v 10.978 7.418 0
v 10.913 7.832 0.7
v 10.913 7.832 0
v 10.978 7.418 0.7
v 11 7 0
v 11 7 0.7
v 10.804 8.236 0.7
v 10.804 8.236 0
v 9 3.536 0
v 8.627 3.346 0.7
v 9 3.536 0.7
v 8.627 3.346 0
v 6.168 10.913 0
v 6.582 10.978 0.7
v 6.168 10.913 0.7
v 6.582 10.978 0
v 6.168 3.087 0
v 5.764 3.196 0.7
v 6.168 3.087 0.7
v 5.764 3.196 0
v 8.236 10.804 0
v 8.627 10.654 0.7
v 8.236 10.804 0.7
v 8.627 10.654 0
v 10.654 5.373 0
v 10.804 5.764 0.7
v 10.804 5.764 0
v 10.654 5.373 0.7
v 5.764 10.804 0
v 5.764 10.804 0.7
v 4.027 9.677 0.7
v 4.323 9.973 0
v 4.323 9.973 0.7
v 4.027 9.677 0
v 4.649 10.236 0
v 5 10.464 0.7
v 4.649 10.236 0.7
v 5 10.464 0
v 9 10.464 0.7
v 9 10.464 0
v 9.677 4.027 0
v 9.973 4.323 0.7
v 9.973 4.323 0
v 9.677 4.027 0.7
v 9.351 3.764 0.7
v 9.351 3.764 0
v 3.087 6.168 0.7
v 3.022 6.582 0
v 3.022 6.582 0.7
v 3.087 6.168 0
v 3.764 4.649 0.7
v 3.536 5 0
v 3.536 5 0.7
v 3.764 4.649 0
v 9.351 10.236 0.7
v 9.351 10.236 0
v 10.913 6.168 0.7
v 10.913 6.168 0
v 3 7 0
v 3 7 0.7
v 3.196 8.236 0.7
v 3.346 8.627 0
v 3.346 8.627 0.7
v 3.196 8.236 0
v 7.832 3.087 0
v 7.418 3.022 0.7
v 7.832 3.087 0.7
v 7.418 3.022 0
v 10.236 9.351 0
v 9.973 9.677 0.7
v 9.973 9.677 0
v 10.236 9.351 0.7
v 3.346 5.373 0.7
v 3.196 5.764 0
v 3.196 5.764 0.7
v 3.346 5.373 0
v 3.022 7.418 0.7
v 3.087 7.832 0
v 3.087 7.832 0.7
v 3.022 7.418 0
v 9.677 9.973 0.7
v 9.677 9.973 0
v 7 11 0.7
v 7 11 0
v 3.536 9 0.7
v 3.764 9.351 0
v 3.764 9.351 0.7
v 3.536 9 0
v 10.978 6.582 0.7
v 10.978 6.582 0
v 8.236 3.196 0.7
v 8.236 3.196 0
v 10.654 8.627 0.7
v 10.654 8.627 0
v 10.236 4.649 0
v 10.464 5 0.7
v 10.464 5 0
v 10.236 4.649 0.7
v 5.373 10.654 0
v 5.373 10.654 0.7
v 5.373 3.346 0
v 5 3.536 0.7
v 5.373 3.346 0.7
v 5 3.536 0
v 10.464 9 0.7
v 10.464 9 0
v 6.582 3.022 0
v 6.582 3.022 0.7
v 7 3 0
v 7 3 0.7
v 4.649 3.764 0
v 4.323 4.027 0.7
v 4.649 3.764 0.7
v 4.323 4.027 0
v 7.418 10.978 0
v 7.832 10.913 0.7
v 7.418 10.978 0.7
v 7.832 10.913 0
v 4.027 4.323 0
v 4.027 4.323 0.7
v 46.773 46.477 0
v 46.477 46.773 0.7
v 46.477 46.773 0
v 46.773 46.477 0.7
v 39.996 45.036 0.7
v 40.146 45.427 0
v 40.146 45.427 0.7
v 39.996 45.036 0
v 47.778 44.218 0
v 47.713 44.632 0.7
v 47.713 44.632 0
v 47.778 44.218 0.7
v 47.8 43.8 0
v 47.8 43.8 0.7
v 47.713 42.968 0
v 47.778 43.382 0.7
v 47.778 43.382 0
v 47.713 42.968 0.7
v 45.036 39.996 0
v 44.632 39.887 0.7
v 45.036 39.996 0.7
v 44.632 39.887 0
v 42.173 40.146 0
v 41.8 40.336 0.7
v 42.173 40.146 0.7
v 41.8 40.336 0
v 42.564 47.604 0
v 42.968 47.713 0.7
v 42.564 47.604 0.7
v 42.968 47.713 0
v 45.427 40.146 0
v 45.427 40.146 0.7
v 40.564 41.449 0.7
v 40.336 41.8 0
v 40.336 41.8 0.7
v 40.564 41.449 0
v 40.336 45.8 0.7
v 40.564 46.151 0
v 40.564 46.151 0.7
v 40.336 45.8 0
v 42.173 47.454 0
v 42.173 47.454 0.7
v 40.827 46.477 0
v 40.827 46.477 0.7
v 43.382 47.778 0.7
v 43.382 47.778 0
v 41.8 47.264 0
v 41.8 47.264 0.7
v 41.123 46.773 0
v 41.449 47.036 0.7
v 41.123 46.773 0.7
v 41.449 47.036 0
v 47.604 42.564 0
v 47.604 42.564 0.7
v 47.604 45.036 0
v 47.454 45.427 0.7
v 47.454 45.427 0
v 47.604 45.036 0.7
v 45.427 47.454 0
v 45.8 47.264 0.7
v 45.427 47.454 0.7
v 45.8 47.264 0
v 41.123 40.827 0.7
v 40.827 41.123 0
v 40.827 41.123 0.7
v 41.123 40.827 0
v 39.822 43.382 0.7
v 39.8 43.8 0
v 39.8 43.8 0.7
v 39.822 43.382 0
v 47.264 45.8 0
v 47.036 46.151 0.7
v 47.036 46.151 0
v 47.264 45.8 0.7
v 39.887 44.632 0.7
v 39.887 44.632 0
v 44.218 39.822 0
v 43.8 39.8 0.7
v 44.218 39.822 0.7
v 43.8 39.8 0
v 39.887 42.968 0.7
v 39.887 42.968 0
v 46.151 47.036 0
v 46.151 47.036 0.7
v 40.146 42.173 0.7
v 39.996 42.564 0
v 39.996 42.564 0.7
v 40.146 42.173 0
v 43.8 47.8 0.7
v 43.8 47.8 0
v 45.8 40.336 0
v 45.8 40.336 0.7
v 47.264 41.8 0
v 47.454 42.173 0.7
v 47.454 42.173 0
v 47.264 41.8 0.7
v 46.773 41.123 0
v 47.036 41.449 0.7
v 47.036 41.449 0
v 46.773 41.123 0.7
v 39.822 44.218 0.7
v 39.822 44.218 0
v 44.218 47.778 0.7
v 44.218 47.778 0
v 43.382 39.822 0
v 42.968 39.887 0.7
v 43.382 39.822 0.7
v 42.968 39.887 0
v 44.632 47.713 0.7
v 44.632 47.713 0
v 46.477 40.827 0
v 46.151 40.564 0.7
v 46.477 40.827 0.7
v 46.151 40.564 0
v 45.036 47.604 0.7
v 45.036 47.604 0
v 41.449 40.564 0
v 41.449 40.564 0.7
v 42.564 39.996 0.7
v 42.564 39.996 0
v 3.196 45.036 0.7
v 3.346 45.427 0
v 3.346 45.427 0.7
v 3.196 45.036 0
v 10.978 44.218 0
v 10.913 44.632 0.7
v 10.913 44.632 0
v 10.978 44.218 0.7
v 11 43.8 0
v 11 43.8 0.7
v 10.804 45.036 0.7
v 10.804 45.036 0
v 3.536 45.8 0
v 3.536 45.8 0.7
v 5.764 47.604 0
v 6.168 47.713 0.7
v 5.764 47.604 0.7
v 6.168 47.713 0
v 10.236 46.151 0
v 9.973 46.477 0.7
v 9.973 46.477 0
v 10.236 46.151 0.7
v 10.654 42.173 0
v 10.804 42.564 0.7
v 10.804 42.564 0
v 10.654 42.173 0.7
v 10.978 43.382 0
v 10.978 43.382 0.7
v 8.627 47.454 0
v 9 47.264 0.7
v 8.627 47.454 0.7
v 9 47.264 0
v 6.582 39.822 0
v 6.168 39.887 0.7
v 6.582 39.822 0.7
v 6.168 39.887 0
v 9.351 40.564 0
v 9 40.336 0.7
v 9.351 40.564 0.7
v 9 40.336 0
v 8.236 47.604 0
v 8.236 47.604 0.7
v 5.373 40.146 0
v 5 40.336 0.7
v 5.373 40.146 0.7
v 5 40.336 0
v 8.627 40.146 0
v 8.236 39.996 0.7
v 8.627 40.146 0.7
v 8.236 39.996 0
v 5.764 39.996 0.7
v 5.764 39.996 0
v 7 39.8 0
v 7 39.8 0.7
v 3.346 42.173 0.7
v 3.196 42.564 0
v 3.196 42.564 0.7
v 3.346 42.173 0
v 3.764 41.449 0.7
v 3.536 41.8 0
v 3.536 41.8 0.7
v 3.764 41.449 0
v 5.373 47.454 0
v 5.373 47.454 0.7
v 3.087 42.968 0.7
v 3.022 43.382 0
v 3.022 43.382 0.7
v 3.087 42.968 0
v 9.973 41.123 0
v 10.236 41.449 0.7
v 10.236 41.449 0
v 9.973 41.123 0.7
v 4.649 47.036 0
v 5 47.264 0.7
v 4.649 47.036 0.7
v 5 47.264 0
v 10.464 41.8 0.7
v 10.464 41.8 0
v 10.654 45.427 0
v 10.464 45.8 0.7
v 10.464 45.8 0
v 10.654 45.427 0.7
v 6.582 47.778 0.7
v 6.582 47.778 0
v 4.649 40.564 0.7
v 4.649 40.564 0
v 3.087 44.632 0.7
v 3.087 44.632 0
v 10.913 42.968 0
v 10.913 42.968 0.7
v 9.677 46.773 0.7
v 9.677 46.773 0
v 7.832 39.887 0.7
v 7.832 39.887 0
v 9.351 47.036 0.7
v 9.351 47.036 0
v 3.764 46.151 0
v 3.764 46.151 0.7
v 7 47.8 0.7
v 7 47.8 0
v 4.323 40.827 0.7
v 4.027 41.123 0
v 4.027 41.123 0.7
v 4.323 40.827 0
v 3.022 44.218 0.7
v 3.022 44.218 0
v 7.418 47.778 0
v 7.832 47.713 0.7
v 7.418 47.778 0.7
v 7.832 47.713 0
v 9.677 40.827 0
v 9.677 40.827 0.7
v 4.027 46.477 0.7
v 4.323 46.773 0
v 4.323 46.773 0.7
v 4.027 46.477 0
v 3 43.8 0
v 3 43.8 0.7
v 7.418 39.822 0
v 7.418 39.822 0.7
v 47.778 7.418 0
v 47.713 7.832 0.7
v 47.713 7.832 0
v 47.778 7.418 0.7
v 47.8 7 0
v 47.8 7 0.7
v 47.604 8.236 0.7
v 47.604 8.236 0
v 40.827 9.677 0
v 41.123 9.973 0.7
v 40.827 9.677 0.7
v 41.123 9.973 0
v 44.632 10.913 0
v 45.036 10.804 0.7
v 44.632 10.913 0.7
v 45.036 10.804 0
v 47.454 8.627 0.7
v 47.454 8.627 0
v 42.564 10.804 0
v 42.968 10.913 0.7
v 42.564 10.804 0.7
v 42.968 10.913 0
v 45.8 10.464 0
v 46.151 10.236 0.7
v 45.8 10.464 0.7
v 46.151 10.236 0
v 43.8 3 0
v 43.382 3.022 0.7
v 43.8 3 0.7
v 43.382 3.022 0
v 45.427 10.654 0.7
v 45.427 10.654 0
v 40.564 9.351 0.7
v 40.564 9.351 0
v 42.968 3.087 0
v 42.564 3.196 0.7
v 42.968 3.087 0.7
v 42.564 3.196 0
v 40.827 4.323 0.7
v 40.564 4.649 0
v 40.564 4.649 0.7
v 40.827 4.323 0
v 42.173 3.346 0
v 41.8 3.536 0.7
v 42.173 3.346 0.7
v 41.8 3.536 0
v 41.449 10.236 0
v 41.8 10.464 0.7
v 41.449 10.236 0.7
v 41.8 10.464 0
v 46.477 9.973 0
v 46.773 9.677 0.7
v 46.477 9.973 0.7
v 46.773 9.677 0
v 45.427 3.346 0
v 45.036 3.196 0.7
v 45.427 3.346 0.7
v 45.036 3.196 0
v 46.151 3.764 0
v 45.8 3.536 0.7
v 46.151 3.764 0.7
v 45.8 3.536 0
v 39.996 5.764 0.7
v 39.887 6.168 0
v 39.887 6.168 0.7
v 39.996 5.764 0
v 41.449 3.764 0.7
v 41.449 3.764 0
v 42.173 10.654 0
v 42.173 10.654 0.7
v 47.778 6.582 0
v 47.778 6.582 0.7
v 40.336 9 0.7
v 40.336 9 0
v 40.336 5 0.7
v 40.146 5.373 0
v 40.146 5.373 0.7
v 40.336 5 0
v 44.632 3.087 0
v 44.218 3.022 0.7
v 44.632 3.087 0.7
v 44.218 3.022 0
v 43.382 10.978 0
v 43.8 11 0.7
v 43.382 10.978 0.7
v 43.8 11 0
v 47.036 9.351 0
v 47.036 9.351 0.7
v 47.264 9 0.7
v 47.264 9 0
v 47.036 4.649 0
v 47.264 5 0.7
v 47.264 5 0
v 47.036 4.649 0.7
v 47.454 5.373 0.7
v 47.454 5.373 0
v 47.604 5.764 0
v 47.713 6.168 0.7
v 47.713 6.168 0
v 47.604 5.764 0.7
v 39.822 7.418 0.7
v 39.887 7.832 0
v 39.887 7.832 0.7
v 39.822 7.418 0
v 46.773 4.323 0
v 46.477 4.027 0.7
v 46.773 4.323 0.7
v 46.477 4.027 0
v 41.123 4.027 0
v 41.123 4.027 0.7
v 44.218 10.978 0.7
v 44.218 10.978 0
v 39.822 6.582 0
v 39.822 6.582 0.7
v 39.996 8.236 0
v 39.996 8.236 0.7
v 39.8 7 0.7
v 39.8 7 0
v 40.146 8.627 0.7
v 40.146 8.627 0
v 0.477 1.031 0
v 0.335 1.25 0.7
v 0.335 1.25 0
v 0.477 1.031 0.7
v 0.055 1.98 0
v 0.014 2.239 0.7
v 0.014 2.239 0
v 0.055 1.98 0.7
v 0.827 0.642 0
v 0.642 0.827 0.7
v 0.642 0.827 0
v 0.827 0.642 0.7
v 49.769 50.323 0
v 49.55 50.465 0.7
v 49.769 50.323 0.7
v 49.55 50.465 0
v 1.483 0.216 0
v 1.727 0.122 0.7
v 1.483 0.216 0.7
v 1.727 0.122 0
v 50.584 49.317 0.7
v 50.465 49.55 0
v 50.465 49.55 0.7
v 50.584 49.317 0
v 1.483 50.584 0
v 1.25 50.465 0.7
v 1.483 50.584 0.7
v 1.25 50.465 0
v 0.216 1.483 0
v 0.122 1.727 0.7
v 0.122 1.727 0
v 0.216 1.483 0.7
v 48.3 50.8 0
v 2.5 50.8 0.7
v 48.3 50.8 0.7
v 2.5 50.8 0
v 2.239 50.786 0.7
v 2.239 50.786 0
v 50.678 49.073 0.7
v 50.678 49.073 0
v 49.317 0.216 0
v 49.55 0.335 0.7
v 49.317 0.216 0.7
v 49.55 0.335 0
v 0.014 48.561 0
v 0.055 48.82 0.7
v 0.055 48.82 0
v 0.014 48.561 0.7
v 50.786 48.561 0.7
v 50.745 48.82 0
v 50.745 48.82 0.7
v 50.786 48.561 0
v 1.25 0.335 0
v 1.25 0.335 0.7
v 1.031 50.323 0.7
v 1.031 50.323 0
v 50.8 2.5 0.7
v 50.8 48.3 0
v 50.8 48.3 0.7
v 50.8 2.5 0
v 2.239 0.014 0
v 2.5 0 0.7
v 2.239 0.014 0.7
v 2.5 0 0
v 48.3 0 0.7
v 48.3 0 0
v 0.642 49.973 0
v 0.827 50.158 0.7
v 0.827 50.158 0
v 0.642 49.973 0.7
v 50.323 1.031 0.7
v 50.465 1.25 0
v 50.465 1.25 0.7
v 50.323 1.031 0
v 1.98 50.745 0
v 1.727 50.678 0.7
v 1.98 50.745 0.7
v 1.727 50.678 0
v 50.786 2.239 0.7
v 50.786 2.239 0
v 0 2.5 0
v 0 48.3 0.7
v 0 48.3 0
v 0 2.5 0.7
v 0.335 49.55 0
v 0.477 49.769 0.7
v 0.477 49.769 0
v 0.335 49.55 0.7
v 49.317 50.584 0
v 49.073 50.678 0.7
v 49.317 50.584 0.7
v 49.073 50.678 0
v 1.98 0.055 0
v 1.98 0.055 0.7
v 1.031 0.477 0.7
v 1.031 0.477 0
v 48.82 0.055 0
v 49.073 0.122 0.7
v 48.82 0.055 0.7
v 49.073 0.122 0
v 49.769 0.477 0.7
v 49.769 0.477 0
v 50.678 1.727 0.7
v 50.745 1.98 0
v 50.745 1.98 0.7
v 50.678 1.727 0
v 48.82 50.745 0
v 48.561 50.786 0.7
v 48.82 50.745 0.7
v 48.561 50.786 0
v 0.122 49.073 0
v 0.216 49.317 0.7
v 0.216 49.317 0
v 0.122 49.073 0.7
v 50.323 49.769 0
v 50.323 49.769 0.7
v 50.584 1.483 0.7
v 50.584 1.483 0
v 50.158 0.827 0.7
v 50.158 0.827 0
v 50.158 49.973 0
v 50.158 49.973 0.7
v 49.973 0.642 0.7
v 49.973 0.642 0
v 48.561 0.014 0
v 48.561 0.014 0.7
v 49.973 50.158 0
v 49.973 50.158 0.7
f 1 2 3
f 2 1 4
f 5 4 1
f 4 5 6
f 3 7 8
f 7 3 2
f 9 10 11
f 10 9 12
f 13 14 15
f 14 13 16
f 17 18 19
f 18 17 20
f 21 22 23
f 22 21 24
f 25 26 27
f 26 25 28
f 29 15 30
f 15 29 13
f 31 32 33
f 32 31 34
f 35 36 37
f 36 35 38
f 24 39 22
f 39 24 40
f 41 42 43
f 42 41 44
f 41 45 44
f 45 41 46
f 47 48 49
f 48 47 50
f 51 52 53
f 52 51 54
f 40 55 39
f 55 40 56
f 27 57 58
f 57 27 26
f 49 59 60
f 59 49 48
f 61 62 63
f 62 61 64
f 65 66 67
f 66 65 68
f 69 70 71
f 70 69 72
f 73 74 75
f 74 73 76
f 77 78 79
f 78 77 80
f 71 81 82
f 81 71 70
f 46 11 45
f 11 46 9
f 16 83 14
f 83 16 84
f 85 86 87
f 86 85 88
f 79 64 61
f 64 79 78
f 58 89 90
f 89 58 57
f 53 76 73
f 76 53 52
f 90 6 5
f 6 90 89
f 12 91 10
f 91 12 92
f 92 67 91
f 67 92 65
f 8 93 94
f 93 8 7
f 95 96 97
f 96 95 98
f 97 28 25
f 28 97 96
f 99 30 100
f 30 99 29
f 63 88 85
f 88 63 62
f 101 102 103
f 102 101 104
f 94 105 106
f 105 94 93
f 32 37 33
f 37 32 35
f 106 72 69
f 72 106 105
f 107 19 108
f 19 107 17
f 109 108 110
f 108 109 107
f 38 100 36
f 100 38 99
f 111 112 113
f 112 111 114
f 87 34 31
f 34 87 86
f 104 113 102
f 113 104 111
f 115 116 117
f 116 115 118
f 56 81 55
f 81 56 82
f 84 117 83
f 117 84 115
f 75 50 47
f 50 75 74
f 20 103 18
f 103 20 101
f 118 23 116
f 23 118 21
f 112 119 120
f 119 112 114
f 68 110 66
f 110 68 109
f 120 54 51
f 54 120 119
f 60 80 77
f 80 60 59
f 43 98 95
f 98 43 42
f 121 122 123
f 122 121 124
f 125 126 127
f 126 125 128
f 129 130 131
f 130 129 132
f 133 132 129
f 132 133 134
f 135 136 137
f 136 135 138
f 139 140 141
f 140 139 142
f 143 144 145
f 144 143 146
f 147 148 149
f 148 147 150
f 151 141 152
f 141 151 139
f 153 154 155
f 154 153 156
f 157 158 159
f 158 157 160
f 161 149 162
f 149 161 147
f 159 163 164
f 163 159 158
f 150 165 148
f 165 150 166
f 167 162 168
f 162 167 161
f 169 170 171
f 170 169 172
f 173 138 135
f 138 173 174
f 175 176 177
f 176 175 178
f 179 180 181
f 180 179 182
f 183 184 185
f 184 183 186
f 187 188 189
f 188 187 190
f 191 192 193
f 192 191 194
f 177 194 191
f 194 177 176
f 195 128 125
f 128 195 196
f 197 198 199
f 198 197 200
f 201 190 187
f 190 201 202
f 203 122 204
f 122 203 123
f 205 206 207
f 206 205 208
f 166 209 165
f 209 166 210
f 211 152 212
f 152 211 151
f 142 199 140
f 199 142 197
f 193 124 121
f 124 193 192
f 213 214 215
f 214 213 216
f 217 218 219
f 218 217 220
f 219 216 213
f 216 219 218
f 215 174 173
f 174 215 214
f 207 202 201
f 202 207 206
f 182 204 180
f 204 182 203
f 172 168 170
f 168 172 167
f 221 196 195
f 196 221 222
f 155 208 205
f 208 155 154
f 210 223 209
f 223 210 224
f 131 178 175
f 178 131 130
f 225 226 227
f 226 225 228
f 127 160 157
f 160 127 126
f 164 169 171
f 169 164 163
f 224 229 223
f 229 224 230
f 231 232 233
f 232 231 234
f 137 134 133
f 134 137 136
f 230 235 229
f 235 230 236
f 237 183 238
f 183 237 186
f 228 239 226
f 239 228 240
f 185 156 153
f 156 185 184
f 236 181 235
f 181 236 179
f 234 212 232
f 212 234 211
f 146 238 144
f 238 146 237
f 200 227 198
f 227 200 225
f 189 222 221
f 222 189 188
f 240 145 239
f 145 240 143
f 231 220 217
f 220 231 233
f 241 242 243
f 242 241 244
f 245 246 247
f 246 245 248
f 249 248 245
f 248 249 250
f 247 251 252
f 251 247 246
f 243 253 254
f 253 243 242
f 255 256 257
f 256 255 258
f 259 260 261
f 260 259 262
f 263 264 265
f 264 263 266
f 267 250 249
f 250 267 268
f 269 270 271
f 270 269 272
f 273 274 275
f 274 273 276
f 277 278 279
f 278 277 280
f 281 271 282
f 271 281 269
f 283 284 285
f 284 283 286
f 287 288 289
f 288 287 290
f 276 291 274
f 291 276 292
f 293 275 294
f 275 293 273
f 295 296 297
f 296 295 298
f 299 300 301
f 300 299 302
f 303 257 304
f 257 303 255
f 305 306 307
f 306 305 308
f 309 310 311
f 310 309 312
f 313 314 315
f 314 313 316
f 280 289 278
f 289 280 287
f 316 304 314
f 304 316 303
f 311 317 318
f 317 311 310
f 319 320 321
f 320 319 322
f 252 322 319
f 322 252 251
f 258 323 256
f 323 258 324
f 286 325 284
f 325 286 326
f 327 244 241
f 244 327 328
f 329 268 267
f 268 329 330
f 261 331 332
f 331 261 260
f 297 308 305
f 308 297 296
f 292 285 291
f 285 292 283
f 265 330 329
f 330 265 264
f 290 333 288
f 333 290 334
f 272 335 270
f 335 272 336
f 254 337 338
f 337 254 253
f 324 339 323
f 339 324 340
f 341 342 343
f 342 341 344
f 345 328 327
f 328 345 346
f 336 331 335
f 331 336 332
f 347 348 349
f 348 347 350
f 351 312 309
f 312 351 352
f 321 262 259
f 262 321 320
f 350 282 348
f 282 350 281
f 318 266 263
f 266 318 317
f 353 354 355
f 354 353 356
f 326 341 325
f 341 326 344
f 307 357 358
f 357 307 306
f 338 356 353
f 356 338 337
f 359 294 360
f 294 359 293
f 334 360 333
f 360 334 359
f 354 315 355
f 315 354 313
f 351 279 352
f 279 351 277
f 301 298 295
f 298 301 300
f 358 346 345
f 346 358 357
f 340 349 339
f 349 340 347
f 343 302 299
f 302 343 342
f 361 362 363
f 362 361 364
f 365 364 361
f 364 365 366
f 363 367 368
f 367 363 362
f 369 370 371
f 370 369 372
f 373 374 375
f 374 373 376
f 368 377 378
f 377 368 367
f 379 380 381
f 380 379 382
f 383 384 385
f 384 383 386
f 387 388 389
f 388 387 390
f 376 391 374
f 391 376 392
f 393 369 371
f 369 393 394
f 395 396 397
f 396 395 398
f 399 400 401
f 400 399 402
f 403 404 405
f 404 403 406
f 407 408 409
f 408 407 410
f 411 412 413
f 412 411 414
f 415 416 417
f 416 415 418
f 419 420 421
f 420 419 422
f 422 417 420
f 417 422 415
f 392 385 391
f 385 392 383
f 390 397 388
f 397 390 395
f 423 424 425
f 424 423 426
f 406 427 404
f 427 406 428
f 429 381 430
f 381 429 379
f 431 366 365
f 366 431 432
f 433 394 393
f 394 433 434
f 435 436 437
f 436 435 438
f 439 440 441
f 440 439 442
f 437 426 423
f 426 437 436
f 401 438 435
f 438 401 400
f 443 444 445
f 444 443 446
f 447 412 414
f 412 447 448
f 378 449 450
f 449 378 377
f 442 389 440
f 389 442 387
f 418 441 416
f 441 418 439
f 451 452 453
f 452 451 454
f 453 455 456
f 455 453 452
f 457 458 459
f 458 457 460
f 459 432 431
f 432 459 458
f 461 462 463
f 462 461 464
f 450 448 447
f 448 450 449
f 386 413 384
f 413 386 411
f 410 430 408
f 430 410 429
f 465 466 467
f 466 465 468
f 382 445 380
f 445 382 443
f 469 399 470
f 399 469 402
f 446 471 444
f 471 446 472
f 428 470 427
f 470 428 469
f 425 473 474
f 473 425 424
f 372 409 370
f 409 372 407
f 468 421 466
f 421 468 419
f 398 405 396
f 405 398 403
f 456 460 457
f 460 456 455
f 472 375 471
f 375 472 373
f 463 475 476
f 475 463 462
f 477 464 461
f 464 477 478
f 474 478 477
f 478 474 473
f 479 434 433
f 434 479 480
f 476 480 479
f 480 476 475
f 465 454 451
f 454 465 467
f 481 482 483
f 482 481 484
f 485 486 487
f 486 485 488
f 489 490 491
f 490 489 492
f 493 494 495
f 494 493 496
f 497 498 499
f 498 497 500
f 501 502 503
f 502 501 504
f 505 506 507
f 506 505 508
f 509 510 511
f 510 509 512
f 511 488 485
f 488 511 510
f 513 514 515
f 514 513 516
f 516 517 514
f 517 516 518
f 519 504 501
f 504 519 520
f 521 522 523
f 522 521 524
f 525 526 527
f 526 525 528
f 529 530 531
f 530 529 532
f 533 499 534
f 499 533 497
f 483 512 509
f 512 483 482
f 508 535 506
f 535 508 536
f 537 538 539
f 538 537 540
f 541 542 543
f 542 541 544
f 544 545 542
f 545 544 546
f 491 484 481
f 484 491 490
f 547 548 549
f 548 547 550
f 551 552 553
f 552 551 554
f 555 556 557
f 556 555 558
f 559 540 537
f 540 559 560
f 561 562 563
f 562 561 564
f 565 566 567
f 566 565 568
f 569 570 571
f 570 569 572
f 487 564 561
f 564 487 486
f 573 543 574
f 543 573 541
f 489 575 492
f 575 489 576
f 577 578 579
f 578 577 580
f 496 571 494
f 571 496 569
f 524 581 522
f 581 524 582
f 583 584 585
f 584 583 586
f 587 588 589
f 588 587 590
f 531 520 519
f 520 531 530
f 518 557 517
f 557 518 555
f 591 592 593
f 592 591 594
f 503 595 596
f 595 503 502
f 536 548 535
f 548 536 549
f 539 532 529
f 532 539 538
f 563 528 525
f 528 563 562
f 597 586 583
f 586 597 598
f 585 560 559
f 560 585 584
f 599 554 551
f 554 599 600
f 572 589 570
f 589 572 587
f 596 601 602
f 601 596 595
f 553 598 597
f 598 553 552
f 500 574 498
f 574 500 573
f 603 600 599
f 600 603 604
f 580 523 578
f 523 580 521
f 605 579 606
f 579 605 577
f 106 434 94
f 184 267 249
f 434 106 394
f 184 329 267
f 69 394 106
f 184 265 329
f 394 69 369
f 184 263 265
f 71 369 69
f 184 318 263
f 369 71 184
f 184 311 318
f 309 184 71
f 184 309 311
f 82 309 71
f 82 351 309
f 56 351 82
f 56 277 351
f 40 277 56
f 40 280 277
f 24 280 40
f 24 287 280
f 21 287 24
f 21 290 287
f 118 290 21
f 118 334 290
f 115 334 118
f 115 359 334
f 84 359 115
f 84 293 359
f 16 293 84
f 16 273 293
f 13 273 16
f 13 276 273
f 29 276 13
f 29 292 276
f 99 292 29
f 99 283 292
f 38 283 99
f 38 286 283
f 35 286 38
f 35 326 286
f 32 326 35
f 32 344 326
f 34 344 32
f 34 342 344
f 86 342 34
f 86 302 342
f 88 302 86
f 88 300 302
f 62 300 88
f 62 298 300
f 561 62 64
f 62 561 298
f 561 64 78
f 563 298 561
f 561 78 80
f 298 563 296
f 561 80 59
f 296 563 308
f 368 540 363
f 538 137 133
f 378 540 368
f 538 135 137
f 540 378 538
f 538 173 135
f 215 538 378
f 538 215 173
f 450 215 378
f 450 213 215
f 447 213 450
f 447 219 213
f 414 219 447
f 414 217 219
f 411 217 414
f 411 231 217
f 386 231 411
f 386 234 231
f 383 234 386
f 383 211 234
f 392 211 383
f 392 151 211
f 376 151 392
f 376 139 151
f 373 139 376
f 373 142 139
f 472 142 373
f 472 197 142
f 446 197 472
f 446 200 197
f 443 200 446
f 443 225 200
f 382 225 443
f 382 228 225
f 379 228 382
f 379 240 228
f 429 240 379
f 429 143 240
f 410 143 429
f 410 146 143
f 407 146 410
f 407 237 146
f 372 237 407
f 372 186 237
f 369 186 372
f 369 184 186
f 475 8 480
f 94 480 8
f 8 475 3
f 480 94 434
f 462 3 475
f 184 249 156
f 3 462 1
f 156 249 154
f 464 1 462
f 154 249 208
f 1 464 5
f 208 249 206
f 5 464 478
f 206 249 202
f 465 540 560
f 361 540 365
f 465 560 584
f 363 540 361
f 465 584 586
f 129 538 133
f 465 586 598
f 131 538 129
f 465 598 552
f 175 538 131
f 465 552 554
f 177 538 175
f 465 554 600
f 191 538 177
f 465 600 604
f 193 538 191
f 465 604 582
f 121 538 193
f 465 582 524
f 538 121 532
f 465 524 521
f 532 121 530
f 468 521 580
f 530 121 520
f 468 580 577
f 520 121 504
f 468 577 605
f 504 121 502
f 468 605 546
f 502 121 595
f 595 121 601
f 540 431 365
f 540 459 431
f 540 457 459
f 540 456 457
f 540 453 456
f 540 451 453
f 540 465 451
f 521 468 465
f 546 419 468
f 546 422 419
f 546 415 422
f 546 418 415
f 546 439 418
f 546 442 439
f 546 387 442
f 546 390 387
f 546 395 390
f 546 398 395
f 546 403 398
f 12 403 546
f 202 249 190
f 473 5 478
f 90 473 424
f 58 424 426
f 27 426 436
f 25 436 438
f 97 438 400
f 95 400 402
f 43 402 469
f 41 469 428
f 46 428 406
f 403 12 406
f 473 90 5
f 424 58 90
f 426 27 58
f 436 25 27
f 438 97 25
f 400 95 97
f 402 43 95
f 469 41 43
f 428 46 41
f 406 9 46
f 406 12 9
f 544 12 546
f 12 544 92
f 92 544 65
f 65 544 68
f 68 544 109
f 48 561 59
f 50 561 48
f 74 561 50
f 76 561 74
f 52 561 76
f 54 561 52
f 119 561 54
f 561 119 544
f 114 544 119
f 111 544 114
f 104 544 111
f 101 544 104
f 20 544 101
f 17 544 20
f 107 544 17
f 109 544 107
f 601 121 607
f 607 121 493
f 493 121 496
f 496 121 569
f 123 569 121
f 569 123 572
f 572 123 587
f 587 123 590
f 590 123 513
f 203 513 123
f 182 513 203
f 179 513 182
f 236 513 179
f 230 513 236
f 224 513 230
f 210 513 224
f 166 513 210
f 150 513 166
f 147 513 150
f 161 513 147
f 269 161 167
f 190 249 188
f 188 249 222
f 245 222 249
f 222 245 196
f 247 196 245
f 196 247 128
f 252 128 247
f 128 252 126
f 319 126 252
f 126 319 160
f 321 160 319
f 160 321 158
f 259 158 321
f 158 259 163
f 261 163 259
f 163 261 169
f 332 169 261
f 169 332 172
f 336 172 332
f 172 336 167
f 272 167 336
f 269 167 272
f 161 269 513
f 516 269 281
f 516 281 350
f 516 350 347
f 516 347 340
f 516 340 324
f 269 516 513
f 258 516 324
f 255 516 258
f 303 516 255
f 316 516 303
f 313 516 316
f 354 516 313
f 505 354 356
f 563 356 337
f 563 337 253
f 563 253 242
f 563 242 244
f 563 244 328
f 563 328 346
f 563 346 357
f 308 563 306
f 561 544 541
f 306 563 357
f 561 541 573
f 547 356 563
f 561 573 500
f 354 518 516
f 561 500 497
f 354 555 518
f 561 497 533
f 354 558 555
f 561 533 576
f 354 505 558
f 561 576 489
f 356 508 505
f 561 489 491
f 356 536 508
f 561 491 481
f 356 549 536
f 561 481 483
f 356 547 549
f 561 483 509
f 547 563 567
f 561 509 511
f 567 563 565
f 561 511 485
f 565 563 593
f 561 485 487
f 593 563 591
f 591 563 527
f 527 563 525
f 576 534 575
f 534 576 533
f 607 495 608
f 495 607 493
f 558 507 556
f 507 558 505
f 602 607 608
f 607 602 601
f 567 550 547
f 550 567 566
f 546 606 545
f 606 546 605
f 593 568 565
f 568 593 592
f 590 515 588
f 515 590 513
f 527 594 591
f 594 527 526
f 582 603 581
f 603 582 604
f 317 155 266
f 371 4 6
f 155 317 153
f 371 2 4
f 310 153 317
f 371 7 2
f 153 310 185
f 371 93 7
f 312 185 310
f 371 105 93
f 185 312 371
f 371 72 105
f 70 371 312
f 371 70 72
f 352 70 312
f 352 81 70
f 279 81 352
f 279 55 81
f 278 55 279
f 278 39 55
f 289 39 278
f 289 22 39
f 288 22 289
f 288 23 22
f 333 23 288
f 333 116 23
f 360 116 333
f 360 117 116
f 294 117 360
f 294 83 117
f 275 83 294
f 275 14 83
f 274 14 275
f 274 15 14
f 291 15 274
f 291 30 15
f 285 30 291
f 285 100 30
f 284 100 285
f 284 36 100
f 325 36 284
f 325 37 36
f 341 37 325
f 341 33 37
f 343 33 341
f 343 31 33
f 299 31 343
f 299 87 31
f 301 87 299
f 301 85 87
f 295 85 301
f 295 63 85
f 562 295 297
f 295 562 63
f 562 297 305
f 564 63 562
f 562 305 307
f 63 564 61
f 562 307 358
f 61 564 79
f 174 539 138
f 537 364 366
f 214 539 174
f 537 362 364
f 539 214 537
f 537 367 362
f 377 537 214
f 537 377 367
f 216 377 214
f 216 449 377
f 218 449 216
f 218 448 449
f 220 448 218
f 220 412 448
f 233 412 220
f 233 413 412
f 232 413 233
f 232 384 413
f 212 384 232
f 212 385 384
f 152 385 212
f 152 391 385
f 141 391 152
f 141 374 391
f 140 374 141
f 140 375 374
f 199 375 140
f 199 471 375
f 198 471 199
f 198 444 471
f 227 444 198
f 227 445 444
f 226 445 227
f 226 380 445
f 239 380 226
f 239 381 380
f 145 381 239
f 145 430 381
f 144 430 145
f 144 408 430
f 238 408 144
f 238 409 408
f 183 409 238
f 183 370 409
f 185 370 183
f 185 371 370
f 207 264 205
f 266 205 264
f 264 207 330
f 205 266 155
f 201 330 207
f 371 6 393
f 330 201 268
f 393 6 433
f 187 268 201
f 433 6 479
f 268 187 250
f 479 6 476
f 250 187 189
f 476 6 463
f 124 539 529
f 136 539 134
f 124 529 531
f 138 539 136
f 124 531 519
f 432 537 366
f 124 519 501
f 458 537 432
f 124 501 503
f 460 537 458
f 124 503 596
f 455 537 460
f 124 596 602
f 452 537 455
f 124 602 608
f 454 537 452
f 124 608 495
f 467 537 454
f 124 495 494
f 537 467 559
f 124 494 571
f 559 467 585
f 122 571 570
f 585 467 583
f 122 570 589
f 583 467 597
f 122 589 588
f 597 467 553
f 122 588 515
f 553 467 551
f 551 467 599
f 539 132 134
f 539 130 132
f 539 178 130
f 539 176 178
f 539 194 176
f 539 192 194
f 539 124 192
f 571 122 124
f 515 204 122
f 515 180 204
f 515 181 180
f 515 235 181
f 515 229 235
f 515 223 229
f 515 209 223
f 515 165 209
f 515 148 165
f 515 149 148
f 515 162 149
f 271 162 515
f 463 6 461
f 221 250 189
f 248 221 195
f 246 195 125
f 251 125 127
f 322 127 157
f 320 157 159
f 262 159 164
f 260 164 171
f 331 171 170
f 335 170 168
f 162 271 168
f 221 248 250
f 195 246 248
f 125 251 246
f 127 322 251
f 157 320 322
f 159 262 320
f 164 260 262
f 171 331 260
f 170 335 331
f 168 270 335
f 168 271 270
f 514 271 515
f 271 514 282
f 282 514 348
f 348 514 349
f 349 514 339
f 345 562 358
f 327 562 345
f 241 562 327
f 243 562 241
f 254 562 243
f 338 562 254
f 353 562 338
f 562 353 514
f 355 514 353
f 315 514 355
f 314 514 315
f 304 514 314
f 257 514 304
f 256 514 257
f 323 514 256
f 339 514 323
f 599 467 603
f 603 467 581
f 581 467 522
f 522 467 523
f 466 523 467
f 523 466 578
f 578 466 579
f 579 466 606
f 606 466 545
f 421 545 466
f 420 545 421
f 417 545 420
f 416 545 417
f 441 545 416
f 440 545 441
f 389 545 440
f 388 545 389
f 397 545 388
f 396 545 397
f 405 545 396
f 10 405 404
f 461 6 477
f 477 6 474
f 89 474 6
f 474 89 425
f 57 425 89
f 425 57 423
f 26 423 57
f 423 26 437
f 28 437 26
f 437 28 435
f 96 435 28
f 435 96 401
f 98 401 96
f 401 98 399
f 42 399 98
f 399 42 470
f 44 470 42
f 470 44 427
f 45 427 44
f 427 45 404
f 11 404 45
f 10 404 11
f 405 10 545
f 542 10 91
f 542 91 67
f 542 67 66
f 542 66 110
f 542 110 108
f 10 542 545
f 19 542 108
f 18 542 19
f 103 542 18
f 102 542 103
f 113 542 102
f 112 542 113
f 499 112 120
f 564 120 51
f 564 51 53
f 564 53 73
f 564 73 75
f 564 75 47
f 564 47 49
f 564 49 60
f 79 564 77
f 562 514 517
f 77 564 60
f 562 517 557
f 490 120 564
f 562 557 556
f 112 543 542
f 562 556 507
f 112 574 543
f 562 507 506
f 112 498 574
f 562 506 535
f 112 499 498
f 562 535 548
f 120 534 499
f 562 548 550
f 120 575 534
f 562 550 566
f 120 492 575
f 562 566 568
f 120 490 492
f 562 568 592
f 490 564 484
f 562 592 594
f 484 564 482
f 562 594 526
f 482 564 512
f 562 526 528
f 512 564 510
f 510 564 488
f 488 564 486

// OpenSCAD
//the edge to edge diameter of the card. 50.8 mm = 2 inches.
diameter = 50.8; 
// how far in the holes are from the corners of the card.
inset=7; 
// how thick the cards are. Ideally a multiple or your layer height.
thickness =.7;
//the diameter of the of the corner.  
cornerDiameter =5;
// the diameter of the holes.
holeDiameter=8;
$fn=60;


difference()
{
	translate([cornerDiameter/2,cornerDiameter/2,0])render()
	{
		minkowski()
		{
			cube([diameter-cornerDiameter,diameter-cornerDiameter,thickness/2]);
			cylinder(thickness/2,d=cornerDiameter);
		}
	}
	translate([0,0,0])
		{
			translate([inset,inset,-.1])cylinder(d=holeDiameter,thickness*2);
			translate([diameter-inset,diameter-inset,0-.1])cylinder(d=holeDiameter,thickness*2);
			translate([inset,diameter-inset,-.1])cylinder(d=holeDiameter,thickness*2);
			translate([diameter-inset,inset,-.1])cylinder(d=holeDiameter,thickness*2);
		}
}
